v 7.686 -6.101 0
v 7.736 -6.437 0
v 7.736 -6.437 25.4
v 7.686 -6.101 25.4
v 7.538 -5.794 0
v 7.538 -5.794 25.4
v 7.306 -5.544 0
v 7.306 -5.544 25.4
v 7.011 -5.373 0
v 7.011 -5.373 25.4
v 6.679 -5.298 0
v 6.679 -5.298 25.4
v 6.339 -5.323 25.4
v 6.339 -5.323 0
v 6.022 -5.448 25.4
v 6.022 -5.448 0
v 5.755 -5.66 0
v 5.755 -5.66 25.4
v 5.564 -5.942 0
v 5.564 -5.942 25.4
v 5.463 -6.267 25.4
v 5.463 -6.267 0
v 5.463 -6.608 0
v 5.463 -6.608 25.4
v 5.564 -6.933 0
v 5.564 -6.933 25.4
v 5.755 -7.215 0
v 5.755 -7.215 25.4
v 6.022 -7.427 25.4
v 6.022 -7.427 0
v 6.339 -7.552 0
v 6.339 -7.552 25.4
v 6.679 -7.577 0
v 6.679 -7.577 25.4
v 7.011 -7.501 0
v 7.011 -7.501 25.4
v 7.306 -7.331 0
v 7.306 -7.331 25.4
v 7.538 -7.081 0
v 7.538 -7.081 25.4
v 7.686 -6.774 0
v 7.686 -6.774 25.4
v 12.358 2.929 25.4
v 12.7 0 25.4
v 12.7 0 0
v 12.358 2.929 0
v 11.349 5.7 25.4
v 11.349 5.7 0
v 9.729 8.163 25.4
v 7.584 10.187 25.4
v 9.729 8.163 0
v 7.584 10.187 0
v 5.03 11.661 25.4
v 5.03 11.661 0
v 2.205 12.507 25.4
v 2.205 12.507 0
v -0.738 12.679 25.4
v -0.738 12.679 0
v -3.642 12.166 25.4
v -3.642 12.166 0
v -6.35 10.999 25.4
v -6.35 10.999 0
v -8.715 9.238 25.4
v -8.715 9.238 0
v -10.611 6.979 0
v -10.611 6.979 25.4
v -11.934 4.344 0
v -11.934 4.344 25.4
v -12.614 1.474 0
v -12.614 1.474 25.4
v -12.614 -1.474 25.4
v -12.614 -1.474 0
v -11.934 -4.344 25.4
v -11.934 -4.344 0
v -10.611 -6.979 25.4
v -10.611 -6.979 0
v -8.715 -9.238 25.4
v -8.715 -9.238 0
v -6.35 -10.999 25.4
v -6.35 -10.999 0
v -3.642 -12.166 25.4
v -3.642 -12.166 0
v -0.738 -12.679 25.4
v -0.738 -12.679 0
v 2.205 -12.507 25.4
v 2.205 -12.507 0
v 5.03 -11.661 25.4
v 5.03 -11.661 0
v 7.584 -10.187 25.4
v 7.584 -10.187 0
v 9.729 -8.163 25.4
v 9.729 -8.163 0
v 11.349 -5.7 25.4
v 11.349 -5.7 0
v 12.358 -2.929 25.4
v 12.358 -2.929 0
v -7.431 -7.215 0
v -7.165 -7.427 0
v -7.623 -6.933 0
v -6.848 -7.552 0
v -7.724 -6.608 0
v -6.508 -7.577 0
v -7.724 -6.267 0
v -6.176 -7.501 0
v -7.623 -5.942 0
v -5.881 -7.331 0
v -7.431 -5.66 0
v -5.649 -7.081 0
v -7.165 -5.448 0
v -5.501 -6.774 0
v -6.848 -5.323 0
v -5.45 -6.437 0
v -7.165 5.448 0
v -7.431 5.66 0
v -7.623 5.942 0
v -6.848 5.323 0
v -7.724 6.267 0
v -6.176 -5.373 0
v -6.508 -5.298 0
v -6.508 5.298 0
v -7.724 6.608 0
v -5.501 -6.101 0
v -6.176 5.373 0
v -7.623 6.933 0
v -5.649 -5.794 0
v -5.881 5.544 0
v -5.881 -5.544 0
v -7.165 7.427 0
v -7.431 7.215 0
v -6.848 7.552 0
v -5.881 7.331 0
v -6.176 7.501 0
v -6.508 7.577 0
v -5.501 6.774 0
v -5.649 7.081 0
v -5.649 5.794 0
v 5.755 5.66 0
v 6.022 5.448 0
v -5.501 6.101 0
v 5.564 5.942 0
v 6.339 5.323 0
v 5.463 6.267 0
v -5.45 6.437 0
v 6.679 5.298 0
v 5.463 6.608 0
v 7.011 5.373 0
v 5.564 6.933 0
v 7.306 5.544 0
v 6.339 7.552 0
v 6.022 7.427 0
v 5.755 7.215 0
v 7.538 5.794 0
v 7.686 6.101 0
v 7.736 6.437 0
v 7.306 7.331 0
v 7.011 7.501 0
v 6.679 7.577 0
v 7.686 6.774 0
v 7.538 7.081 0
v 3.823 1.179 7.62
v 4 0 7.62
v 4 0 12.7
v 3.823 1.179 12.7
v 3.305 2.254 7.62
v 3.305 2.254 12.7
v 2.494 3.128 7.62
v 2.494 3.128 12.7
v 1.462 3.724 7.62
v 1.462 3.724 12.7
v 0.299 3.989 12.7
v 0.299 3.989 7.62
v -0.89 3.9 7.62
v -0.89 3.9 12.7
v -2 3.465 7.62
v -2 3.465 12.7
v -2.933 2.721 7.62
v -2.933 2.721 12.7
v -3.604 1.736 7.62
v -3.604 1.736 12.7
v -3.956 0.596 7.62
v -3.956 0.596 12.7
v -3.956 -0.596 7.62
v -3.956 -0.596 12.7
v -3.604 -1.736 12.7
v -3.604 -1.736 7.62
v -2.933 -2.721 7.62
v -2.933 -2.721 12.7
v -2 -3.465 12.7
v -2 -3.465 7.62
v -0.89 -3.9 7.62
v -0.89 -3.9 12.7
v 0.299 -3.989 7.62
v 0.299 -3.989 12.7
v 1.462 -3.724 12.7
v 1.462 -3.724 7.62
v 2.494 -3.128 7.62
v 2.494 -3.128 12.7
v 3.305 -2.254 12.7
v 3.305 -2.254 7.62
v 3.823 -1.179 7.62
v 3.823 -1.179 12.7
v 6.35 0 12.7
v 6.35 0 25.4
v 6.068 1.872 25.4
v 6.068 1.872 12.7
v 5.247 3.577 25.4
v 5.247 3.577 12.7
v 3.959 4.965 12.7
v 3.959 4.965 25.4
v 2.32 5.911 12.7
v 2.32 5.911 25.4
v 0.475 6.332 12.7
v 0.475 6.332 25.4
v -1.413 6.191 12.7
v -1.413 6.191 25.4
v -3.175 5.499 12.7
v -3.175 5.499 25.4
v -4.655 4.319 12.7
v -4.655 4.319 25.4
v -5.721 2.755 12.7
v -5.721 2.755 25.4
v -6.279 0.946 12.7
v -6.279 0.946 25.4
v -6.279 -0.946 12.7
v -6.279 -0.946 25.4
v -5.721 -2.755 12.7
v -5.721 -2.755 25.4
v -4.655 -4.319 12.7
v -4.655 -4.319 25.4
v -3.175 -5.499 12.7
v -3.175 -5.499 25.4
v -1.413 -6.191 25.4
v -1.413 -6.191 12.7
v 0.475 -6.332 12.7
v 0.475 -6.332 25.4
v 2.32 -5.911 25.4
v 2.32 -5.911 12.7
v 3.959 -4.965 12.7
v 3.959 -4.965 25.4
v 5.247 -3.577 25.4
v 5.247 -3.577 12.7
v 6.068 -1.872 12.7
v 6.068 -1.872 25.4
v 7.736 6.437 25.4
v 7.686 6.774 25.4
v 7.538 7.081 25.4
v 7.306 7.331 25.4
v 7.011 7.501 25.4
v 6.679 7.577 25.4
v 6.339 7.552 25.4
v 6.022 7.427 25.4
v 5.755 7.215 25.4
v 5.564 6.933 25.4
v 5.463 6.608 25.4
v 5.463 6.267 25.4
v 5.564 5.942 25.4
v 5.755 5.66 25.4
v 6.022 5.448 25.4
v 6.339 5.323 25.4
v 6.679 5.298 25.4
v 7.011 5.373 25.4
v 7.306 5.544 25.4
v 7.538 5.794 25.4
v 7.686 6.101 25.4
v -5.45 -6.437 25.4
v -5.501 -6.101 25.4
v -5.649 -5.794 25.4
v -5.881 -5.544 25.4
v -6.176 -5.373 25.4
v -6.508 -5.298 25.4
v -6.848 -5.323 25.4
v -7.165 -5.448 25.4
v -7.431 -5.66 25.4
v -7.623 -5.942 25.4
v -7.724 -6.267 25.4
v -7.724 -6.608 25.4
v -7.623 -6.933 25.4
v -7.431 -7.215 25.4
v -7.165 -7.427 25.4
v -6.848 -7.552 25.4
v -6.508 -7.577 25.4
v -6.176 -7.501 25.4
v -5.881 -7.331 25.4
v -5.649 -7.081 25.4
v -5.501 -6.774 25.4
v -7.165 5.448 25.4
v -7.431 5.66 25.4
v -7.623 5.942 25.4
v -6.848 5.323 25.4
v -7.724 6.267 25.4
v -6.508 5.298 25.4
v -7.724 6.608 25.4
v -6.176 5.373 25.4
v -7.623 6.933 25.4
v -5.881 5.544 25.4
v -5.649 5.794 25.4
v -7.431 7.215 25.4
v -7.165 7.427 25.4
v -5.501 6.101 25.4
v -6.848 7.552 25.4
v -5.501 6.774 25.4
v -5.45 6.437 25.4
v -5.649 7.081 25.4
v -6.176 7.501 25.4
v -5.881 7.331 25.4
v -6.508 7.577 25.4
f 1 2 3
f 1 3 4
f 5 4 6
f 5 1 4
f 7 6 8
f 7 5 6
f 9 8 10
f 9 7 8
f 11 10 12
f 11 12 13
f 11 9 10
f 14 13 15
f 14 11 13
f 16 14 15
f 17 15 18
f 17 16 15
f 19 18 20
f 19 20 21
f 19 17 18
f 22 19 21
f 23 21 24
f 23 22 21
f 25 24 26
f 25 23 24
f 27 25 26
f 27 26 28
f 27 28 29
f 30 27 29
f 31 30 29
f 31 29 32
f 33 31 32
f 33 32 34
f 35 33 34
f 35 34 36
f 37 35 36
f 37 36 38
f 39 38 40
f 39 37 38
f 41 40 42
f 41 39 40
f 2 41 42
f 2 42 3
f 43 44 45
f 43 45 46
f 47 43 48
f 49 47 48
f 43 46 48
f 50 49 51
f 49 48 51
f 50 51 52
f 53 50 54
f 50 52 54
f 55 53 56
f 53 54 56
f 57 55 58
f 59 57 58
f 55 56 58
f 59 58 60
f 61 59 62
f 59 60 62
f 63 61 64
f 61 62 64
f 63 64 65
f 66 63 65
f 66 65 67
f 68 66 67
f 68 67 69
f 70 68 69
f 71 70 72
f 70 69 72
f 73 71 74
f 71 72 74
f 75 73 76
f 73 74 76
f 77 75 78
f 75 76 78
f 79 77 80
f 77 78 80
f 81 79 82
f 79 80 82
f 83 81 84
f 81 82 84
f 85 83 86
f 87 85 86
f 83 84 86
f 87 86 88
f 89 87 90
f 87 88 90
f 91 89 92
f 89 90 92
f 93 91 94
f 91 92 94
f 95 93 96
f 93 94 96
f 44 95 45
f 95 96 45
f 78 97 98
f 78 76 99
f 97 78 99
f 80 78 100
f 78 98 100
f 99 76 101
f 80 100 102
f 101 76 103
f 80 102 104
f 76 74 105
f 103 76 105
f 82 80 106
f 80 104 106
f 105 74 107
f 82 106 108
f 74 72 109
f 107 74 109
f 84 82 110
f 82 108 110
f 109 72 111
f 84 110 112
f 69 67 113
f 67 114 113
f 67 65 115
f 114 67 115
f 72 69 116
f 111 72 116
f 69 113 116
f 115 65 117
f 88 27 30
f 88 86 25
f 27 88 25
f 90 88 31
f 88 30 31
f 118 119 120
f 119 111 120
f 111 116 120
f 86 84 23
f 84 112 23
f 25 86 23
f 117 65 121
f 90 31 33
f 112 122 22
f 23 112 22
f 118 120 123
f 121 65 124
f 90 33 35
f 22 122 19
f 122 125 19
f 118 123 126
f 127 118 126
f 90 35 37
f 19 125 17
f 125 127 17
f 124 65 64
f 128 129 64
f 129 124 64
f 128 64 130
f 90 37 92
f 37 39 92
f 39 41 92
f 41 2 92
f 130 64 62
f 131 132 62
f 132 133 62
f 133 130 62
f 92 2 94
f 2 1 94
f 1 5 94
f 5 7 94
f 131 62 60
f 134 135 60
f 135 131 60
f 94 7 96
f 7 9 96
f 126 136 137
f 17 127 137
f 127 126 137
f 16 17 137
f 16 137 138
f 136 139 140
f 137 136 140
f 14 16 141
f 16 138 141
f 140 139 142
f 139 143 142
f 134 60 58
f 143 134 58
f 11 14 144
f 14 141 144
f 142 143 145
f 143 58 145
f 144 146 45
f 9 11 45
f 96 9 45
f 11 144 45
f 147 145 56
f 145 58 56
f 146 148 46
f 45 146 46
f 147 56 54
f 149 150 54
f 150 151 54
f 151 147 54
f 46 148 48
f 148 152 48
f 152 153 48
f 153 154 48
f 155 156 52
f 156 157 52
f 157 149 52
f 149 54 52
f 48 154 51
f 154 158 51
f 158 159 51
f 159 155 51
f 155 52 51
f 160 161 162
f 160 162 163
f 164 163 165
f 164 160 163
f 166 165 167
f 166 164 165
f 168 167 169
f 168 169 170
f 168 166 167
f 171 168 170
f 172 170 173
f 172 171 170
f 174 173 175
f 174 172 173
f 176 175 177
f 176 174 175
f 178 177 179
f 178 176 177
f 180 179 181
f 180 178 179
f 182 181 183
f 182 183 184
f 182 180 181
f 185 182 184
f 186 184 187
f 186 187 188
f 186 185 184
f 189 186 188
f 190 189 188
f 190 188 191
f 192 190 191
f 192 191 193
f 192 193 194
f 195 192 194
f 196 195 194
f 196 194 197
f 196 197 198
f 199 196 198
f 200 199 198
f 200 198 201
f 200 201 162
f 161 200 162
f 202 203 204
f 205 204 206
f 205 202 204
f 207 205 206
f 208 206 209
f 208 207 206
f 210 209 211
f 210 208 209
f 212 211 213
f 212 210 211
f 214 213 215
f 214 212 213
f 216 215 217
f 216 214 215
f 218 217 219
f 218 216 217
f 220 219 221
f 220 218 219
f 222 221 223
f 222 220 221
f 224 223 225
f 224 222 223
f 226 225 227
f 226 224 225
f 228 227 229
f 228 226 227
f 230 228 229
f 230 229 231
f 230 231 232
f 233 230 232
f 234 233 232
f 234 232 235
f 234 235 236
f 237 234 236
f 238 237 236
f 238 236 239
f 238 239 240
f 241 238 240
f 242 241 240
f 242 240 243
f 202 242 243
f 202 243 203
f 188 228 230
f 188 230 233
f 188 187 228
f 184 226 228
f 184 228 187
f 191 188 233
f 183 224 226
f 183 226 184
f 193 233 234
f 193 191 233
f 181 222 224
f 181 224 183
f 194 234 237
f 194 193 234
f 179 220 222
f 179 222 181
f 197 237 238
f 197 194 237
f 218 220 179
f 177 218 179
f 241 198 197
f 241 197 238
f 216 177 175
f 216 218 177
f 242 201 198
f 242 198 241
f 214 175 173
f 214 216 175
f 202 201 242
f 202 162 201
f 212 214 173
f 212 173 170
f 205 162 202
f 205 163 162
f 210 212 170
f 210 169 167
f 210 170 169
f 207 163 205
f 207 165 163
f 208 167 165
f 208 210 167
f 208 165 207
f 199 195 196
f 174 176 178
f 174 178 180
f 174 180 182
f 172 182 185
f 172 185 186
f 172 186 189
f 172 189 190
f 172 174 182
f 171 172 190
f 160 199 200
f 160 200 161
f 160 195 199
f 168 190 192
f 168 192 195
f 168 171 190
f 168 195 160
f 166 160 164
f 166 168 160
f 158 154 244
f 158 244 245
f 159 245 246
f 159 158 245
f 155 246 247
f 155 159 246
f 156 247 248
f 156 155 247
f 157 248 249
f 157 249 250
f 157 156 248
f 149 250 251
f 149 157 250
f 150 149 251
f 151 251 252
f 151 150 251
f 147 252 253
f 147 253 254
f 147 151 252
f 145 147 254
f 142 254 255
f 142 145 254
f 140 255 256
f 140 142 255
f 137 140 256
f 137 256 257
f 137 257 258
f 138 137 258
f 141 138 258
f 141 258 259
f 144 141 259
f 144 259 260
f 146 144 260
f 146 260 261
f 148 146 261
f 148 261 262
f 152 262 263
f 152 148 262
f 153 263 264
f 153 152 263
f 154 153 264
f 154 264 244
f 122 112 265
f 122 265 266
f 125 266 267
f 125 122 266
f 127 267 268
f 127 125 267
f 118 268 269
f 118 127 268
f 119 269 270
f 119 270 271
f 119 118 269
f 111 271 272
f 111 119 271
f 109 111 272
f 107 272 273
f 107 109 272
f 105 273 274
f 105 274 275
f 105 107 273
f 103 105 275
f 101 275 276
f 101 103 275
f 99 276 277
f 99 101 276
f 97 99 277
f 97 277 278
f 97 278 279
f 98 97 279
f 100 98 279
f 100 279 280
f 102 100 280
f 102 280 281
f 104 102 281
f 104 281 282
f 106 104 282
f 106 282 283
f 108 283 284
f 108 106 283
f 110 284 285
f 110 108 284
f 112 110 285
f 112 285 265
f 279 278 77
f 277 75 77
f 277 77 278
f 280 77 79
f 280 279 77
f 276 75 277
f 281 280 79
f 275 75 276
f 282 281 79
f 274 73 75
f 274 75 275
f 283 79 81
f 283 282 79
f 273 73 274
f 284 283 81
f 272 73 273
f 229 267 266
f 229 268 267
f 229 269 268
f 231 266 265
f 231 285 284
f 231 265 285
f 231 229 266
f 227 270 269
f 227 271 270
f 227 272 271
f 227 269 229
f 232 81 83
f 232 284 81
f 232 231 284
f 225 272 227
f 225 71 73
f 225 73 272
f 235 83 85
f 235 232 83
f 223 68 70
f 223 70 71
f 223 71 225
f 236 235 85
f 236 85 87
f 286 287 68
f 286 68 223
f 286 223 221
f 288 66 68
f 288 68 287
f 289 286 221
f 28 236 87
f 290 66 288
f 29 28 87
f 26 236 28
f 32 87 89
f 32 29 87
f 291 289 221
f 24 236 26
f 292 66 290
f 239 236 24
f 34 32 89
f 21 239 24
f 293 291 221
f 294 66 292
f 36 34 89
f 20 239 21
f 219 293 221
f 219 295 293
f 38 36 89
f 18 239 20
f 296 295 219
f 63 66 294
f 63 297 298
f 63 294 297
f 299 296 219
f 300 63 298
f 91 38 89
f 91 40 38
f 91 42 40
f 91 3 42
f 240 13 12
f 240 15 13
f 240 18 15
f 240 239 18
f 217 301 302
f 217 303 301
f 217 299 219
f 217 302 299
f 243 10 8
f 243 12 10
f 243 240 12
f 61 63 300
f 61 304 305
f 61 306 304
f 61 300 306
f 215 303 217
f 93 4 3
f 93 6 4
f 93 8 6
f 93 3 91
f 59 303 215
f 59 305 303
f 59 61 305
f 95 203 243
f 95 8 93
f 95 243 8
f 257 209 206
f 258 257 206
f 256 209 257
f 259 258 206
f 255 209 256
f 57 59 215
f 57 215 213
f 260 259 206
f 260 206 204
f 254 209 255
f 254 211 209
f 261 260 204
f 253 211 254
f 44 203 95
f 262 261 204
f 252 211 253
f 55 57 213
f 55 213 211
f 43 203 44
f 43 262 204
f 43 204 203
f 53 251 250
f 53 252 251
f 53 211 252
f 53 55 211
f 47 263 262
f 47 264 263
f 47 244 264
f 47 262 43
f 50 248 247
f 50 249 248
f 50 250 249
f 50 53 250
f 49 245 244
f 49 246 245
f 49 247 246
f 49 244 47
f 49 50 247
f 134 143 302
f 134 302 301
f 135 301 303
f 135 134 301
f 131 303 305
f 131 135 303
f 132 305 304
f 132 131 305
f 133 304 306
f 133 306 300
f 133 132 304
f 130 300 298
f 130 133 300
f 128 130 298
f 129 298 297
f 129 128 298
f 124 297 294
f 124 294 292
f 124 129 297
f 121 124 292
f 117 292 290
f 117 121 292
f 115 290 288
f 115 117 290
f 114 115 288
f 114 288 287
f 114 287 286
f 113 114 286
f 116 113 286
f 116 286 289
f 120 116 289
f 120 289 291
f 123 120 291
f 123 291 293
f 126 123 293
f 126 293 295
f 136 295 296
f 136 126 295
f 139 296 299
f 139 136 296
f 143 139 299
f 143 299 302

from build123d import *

# Parameters (mm, degrees)
F0_R     = 12.7
F0_R_2   = 1.143
F0_R_3   = 6.35
F1_DEPTH = 25.4
F0_R_4   = 4.0005
F2_DEPTH = 12.7
F3_DEPTH = 7.62


with BuildPart() as f1:
    # F0 (on Top) → F1 (new body)
    with BuildSketch(Plane.XY):
        Circle(F0_R)
        with Locations((-6.593356, -6.437466)):
            Circle(F0_R_2, mode=Mode.SUBTRACT)
        Circle(F0_R_3, mode=Mode.SUBTRACT)
        with Locations((6.593356, -6.437466)):
            Circle(F0_R_2, mode=Mode.SUBTRACT)
        with Locations((-6.593356, 6.437466)):
            Circle(F0_R_2, mode=Mode.SUBTRACT)
        with Locations((6.593356, 6.437466)):
            Circle(F0_R_2, mode=Mode.SUBTRACT)
    extrude(amount=F1_DEPTH)

    # F0 (on Top) → F2 (join)
    with BuildSketch(Plane.XY):
        Circle(F0_R_3)
        Circle(F0_R_4, mode=Mode.SUBTRACT)
    extrude(amount=F2_DEPTH)

    # F0 (on Top) → F3 (join)
    with BuildSketch(Plane.XY):
        Circle(F0_R_4)
    extrude(amount=F3_DEPTH)


solid = f1.part
